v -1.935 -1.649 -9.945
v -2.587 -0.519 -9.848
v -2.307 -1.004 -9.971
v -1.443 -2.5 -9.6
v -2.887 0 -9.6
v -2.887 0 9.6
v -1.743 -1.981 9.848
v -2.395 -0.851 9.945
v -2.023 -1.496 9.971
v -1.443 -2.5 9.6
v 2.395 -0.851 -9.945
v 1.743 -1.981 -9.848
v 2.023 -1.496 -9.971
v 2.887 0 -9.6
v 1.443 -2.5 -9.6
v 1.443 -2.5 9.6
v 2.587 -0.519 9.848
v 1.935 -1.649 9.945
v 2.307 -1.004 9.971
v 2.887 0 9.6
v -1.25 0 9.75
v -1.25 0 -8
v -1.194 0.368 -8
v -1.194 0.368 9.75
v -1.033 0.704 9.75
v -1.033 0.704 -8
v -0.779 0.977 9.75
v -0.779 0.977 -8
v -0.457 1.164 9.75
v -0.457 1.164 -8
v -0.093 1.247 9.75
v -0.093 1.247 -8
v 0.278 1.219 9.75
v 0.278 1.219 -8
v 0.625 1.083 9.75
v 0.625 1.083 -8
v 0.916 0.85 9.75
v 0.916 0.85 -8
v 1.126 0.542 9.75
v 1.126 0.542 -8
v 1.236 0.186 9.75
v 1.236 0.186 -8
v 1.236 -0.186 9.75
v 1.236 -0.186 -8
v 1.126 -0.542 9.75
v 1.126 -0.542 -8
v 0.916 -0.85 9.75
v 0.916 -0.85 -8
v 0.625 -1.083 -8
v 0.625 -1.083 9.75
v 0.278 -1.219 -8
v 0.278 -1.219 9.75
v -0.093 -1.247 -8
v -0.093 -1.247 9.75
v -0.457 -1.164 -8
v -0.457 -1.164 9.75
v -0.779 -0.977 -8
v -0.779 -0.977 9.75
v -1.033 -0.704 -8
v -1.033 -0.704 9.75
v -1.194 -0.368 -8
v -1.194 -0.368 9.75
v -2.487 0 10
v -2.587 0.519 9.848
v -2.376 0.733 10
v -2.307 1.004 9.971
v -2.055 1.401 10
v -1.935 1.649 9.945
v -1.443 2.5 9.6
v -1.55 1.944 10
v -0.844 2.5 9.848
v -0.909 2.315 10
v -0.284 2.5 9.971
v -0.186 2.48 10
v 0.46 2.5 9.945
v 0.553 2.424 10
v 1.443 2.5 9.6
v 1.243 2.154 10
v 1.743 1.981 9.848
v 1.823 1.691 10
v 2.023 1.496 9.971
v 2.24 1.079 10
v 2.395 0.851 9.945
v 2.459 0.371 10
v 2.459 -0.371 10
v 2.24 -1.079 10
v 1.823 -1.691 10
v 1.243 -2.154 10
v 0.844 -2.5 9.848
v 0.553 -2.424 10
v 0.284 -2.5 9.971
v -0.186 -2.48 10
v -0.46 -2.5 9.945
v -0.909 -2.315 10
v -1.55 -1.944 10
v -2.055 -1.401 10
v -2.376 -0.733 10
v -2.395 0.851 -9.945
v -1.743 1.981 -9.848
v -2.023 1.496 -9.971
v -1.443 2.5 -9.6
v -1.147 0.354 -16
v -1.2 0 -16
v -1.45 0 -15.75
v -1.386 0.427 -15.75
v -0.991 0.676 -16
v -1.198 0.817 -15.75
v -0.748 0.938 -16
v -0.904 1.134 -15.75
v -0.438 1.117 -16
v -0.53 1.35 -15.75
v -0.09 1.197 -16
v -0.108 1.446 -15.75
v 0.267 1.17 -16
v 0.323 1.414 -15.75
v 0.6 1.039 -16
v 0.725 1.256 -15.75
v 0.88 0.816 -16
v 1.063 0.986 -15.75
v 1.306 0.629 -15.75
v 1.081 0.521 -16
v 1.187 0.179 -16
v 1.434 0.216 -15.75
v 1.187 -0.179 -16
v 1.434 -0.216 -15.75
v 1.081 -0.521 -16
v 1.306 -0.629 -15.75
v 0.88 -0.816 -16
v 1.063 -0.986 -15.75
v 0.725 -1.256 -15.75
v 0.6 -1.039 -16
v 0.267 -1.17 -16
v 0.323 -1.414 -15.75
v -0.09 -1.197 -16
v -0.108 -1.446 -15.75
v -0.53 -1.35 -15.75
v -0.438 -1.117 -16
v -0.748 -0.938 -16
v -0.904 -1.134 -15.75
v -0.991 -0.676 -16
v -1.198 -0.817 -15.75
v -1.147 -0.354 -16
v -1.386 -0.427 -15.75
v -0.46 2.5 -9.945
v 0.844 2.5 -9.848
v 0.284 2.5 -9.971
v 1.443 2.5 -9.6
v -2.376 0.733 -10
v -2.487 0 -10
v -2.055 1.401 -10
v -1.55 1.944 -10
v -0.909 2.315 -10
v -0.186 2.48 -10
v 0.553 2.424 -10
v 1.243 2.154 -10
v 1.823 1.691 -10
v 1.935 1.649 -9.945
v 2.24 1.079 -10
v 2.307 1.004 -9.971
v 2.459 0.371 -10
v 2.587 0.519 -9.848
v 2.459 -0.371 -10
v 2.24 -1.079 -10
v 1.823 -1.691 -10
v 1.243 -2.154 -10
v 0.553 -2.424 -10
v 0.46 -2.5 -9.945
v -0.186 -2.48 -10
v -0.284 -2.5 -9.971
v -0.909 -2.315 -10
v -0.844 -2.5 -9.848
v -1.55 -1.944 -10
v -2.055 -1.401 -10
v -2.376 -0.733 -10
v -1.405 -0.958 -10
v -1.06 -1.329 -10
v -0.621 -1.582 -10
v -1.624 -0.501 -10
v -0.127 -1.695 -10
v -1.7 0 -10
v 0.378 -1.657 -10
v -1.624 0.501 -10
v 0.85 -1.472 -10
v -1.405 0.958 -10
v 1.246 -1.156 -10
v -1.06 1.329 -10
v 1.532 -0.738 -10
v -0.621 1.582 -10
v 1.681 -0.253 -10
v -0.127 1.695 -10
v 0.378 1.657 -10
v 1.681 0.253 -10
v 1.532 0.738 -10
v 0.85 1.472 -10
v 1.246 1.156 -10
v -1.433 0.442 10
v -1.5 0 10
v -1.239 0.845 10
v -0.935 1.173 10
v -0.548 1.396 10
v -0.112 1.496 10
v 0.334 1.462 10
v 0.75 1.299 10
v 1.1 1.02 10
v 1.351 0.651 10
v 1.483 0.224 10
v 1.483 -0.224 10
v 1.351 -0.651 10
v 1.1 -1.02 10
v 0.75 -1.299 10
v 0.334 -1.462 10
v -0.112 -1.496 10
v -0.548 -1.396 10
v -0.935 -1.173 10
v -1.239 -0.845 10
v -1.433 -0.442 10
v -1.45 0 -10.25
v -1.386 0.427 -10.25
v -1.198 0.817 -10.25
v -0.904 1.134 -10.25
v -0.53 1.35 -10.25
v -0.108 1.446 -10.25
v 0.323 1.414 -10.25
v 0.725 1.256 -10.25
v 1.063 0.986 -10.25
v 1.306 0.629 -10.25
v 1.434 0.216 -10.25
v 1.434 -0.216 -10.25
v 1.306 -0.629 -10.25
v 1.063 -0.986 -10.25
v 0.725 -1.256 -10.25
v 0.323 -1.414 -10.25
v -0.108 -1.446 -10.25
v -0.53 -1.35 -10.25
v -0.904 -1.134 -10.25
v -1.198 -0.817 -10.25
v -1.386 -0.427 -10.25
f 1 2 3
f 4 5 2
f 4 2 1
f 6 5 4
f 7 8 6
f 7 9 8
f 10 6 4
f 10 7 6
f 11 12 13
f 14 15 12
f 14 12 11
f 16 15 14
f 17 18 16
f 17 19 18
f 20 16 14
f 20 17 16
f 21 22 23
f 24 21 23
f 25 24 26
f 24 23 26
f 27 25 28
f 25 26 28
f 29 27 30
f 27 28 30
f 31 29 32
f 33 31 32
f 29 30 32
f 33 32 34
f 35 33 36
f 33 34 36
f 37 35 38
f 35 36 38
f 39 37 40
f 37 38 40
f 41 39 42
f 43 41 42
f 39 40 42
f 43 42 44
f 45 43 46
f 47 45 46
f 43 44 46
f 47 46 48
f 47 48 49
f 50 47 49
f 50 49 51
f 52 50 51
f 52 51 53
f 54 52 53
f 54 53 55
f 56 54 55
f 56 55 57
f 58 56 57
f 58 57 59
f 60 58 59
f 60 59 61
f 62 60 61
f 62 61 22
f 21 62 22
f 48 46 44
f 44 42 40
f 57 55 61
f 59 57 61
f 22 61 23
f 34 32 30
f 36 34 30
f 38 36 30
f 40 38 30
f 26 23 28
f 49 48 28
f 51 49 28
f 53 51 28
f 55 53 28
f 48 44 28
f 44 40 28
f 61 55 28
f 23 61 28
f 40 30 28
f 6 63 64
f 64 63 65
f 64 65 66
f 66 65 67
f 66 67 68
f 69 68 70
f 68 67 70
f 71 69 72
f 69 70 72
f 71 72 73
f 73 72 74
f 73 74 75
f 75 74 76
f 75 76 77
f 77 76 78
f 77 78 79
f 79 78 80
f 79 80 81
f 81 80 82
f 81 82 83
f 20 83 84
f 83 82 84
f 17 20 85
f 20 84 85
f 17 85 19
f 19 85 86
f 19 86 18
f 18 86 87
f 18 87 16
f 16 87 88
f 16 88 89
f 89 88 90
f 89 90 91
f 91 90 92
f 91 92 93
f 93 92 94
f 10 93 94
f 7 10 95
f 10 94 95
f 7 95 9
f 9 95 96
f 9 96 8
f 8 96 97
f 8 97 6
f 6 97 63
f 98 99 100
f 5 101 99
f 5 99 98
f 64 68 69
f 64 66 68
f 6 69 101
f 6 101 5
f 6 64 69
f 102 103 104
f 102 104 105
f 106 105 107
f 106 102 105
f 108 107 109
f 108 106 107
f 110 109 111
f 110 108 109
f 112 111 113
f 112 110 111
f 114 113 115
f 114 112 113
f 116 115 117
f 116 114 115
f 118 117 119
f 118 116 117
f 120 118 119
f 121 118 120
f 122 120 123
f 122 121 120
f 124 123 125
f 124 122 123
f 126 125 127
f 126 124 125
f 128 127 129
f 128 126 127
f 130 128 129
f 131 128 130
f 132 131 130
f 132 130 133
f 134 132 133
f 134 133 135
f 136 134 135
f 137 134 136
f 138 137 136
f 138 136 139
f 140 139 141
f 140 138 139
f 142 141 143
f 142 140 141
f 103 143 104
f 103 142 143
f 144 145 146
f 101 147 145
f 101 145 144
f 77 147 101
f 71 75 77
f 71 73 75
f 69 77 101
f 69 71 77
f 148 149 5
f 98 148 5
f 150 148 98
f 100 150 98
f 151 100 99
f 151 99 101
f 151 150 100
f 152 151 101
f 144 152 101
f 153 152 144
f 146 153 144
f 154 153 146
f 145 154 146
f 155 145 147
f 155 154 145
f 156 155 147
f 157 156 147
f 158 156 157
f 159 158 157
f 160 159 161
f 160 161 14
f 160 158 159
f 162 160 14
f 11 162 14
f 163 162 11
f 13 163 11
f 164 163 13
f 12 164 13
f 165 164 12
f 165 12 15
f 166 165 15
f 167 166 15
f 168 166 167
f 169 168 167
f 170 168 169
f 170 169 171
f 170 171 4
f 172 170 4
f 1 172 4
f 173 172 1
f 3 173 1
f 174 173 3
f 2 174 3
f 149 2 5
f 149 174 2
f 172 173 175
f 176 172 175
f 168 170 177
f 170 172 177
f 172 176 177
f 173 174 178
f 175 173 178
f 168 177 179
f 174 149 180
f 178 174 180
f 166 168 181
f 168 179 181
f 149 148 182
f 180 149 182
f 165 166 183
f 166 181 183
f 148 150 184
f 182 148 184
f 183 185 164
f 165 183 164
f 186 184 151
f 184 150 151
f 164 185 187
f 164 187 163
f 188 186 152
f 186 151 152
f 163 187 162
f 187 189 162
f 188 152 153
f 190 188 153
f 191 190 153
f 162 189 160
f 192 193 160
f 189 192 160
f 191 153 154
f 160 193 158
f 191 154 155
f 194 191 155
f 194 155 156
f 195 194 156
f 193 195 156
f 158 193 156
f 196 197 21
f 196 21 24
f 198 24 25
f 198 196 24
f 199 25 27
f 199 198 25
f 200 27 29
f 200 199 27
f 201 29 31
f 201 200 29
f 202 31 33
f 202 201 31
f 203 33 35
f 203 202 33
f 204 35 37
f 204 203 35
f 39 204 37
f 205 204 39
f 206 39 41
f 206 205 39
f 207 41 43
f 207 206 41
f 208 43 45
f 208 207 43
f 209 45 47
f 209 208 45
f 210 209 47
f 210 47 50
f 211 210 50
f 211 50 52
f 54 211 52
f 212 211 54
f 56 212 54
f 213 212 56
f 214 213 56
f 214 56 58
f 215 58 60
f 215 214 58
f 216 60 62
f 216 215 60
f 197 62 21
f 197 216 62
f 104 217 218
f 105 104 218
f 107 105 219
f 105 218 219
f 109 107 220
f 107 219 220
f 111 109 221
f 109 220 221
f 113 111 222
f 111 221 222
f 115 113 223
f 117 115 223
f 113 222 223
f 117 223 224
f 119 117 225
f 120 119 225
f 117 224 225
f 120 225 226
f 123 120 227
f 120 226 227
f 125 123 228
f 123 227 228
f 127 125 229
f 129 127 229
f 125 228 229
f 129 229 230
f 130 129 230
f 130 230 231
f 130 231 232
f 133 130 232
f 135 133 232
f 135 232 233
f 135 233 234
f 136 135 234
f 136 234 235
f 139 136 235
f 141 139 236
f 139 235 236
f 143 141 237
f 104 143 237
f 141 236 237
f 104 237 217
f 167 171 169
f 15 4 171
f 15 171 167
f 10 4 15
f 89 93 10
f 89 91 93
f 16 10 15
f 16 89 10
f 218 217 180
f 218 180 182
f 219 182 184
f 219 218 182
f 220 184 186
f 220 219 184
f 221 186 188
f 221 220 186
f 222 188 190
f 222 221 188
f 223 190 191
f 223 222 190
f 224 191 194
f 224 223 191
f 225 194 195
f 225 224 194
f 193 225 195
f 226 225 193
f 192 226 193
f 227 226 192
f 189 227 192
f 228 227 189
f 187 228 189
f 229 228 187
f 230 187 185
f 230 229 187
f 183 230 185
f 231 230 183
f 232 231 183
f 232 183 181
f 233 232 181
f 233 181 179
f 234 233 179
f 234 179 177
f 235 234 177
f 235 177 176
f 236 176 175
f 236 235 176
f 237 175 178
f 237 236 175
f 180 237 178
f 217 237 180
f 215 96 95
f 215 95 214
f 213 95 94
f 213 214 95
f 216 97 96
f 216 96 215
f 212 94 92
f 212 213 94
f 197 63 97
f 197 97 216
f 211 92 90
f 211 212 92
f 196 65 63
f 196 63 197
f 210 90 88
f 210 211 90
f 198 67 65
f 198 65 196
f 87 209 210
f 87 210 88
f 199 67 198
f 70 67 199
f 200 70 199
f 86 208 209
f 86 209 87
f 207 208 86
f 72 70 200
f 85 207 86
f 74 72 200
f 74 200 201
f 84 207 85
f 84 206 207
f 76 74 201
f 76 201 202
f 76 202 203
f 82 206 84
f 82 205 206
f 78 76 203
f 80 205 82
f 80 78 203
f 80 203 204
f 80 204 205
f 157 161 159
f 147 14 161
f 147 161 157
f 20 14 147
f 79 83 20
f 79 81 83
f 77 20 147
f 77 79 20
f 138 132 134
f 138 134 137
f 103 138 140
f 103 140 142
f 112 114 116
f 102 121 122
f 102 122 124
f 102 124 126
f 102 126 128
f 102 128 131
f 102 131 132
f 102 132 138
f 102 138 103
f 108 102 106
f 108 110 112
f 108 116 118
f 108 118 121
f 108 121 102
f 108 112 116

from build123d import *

# Parameters (mm, degrees)
HEX_2_DEPTH                 = 10
TAP_DRILL_FOR_M3X0_5_TAP1_D = 2.5
SKETCH8_R                   = 1.45
THREAD_DEPTH                = 6
THREAD_DEPTH_BACK           = 2
INNERCHAMFER_SIZE           = 0.25


with BuildPart() as part:
    # Sketch1 → HEX 2 (new body, symmetric)
    with BuildSketch(Plane.XY):
        Polygon((2.886751346, 0), (1.443375673, 2.5), (-1.443375673, 2.5), (-2.886751346, 0), (-1.443375673, -2.5), (1.443375673, -2.5), align=None)
    extrude(amount=HEX_2_DEPTH, both=True)

    # Tap Drill for M3x0.5 Tap1 (through all)
    with Locations(Plane.XY.offset(10)):
        with Locations((0, 0)):
            Hole(TAP_DRILL_FOR_M3X0_5_TAP1_D / 2)

    # Sketch7 → HexChamfer (revolve, cut)
    with BuildSketch(Plane(origin=(0, 0, 0), x_dir=(1, 0, 0), z_dir=(0, 1, 0))):
        Polygon((-2.886751346, 10), (-2.886751346, 9.6), (-2.486751346, 10), align=None)
    hexchamfer = revolve(axis=Axis((0, 0, 15.266742202), (0, 0, -1)), mode=Mode.SUBTRACT)

    # Mirror1: HexChamfer across plane
    add(hexchamfer.mirror(Plane.XY), mode=Mode.SUBTRACT)

    # Sketch8 → Thread (add, two sides)
    with BuildSketch(Plane(origin=(0, 0, -10), x_dir=(-1, 0, 0), z_dir=(0, 0, -1))) as thread_sk:
        Circle(SKETCH8_R)
    extrude(amount=THREAD_DEPTH)
    extrude(thread_sk.sketch, amount=-THREAD_DEPTH_BACK)

    # InnerChamfer
    innerchamfer_edges = [part.edges().sort_by_distance(p)[0] for p in [
        (1.25, 0, 10),
        (1.45, 0, -10),
        (1.45, 0, -16),
    ]]
    chamfer(innerchamfer_edges, length=INNERCHAMFER_SIZE)


solid = part.part
